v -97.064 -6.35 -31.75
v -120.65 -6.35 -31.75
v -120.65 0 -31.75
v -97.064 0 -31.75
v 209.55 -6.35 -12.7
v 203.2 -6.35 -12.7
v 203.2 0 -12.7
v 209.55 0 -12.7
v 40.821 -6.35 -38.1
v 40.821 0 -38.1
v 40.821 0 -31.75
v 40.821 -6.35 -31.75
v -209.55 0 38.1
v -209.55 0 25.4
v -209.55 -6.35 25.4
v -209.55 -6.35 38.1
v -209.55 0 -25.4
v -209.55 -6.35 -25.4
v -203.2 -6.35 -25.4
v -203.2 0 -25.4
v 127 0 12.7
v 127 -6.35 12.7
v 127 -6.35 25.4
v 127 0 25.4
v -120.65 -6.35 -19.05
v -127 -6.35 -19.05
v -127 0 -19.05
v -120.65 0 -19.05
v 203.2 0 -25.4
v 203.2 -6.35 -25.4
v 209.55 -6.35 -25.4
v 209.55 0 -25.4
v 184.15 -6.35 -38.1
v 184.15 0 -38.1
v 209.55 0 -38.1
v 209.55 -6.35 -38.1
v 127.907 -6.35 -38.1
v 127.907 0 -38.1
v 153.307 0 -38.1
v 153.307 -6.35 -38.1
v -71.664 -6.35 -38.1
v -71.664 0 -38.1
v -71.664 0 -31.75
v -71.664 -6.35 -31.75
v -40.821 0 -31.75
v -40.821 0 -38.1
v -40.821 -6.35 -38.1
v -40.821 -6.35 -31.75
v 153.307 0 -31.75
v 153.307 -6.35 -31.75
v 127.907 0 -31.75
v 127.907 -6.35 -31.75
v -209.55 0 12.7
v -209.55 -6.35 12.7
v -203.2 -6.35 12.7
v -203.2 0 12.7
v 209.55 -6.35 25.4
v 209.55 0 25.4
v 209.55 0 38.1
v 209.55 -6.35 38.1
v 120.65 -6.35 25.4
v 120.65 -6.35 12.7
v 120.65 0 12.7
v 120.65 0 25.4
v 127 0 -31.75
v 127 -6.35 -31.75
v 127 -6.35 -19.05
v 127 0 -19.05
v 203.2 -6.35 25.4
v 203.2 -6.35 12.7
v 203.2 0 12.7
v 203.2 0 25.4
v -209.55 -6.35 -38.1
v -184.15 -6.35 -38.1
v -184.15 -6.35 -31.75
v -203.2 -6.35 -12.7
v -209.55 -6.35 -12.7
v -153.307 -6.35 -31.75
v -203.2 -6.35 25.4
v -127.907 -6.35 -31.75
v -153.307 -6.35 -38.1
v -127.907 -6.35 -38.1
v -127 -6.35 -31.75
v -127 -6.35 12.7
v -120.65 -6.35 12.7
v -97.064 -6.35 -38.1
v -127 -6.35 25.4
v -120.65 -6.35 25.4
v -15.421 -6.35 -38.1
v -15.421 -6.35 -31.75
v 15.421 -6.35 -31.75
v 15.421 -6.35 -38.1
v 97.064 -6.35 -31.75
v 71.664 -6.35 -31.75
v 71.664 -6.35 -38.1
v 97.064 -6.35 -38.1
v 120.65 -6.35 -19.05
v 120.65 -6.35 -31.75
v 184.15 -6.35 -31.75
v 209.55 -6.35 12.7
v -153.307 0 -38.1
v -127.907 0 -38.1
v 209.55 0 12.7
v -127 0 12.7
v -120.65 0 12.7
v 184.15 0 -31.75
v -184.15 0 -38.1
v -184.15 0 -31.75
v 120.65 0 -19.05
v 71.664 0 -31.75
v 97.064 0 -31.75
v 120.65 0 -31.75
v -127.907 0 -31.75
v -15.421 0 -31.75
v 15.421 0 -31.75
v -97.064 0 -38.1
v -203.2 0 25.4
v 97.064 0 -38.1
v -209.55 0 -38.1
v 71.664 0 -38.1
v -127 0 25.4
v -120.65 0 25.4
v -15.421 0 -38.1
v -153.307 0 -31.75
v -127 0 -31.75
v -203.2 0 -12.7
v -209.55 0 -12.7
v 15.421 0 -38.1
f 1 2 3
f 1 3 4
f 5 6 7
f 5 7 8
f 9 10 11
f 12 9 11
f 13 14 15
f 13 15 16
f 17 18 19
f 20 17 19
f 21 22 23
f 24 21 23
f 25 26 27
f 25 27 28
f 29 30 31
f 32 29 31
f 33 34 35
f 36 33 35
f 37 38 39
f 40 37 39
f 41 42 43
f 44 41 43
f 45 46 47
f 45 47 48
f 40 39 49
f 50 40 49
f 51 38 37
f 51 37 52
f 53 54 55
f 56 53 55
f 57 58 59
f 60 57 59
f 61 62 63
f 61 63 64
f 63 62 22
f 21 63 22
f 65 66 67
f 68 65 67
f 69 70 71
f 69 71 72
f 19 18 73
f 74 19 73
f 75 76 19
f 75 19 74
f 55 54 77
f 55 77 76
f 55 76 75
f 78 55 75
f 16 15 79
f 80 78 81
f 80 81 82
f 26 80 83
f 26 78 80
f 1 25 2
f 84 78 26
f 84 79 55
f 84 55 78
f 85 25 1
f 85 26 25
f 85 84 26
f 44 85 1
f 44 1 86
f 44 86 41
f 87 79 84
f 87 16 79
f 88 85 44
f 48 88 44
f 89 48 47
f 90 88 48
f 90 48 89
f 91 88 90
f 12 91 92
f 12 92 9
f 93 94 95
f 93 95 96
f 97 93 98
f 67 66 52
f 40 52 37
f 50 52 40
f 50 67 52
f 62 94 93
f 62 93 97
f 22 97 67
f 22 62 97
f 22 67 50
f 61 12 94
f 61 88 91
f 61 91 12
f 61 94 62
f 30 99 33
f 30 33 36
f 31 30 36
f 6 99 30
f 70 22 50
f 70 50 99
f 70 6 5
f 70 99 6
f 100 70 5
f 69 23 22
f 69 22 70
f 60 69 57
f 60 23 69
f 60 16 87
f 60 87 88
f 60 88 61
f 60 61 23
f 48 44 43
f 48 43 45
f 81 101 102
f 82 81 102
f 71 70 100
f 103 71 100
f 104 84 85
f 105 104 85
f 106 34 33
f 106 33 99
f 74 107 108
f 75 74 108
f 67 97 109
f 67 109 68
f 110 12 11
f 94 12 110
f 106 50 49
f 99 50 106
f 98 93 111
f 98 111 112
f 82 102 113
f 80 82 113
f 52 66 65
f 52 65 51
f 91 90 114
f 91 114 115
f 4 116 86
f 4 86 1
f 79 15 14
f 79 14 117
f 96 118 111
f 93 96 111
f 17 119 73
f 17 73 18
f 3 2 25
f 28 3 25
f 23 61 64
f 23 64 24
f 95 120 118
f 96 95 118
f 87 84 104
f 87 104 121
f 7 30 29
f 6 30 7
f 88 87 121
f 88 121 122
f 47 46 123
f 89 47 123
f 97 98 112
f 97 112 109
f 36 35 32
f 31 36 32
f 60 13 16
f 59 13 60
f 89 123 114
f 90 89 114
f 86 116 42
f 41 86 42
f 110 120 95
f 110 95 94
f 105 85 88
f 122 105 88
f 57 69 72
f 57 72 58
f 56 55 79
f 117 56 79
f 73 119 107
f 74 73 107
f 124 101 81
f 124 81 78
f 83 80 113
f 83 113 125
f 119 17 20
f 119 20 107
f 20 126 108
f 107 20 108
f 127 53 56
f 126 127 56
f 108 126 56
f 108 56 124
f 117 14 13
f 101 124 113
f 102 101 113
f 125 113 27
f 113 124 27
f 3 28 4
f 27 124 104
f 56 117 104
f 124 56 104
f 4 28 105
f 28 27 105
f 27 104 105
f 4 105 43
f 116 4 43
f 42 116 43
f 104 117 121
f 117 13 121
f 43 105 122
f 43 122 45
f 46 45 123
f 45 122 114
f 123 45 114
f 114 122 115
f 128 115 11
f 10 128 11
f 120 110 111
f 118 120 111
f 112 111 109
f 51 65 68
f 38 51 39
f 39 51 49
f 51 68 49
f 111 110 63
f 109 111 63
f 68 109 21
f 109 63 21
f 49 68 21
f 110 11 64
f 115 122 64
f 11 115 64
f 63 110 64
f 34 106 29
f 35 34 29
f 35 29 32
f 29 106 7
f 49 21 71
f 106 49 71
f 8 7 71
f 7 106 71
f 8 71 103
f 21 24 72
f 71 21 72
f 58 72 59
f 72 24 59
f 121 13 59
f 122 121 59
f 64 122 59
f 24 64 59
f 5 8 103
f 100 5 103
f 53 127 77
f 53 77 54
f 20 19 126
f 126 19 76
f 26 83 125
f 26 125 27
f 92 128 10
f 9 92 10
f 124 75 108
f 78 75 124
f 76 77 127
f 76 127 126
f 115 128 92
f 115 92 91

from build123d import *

# Parameters (mm, degrees)
F0_W     = 419.1
F0_H     = 76.2
F1_DEPTH = 6.35
F2_W     = 30.842857
F2_H     = 6.35
F2_W_2   = 30.842858
F2_W_3   = 6.35
F2_H_2   = 12.7
F3_DEPTH = 6.351
F4_W     = 6.35
F4_H     = 12.7
F5_DEPTH = 6.351


with BuildPart() as f1:
    # F0 (on Front) → F1 (new body)
    with BuildSketch(Plane.XZ):
        Rectangle(F0_W, F0_H)
    extrude(amount=F1_DEPTH)

    # F2 (on face) → F3 (cut, through all)
    with BuildSketch(Plane.XZ.offset(6.35)):
        with Locations((-168.728571, -34.925)):
            Rectangle(F2_W, F2_H)
        with Locations((-112.485715, -34.925)):
            Rectangle(F2_W, F2_H)
        with Locations((-56.242857, -34.925)):
            Rectangle(F2_W, F2_H)
        with Locations((0, -34.925)):
            Rectangle(F2_W_2, F2_H)
        with Locations((56.242857, -34.925)):
            Rectangle(F2_W, F2_H)
        with Locations((112.485715, -34.925)):
            Rectangle(F2_W, F2_H)
        with Locations((168.728571, -34.925)):
            Rectangle(F2_W, F2_H)
        with Locations((-206.375, -19.05)):
            Rectangle(F2_W_3, F2_H_2)
        with Locations((-206.375, 19.05)):
            Rectangle(F2_W_3, F2_H_2)
        with Locations((206.375, 19.05)):
            Rectangle(F2_W_3, F2_H_2)
        with Locations((206.375, -19.05)):
            Rectangle(F2_W_3, F2_H_2)
    extrude(amount=-F3_DEPTH, mode=Mode.SUBTRACT)

    # F4 (on face) → F5 (cut, through all)
    with BuildSketch(Plane.XZ.offset(6.35)):
        with Locations((-123.825, -25.4)):
            Rectangle(F4_W, F4_H)
        with Locations((-123.825, 19.05)):
            Rectangle(F4_W, F4_H)
        with Locations((123.825, 19.05)):
            Rectangle(F4_W, F4_H)
        with Locations((123.825, -25.4)):
            Rectangle(F4_W, F4_H)
    extrude(amount=-F5_DEPTH, mode=Mode.SUBTRACT)


solid = f1.part
